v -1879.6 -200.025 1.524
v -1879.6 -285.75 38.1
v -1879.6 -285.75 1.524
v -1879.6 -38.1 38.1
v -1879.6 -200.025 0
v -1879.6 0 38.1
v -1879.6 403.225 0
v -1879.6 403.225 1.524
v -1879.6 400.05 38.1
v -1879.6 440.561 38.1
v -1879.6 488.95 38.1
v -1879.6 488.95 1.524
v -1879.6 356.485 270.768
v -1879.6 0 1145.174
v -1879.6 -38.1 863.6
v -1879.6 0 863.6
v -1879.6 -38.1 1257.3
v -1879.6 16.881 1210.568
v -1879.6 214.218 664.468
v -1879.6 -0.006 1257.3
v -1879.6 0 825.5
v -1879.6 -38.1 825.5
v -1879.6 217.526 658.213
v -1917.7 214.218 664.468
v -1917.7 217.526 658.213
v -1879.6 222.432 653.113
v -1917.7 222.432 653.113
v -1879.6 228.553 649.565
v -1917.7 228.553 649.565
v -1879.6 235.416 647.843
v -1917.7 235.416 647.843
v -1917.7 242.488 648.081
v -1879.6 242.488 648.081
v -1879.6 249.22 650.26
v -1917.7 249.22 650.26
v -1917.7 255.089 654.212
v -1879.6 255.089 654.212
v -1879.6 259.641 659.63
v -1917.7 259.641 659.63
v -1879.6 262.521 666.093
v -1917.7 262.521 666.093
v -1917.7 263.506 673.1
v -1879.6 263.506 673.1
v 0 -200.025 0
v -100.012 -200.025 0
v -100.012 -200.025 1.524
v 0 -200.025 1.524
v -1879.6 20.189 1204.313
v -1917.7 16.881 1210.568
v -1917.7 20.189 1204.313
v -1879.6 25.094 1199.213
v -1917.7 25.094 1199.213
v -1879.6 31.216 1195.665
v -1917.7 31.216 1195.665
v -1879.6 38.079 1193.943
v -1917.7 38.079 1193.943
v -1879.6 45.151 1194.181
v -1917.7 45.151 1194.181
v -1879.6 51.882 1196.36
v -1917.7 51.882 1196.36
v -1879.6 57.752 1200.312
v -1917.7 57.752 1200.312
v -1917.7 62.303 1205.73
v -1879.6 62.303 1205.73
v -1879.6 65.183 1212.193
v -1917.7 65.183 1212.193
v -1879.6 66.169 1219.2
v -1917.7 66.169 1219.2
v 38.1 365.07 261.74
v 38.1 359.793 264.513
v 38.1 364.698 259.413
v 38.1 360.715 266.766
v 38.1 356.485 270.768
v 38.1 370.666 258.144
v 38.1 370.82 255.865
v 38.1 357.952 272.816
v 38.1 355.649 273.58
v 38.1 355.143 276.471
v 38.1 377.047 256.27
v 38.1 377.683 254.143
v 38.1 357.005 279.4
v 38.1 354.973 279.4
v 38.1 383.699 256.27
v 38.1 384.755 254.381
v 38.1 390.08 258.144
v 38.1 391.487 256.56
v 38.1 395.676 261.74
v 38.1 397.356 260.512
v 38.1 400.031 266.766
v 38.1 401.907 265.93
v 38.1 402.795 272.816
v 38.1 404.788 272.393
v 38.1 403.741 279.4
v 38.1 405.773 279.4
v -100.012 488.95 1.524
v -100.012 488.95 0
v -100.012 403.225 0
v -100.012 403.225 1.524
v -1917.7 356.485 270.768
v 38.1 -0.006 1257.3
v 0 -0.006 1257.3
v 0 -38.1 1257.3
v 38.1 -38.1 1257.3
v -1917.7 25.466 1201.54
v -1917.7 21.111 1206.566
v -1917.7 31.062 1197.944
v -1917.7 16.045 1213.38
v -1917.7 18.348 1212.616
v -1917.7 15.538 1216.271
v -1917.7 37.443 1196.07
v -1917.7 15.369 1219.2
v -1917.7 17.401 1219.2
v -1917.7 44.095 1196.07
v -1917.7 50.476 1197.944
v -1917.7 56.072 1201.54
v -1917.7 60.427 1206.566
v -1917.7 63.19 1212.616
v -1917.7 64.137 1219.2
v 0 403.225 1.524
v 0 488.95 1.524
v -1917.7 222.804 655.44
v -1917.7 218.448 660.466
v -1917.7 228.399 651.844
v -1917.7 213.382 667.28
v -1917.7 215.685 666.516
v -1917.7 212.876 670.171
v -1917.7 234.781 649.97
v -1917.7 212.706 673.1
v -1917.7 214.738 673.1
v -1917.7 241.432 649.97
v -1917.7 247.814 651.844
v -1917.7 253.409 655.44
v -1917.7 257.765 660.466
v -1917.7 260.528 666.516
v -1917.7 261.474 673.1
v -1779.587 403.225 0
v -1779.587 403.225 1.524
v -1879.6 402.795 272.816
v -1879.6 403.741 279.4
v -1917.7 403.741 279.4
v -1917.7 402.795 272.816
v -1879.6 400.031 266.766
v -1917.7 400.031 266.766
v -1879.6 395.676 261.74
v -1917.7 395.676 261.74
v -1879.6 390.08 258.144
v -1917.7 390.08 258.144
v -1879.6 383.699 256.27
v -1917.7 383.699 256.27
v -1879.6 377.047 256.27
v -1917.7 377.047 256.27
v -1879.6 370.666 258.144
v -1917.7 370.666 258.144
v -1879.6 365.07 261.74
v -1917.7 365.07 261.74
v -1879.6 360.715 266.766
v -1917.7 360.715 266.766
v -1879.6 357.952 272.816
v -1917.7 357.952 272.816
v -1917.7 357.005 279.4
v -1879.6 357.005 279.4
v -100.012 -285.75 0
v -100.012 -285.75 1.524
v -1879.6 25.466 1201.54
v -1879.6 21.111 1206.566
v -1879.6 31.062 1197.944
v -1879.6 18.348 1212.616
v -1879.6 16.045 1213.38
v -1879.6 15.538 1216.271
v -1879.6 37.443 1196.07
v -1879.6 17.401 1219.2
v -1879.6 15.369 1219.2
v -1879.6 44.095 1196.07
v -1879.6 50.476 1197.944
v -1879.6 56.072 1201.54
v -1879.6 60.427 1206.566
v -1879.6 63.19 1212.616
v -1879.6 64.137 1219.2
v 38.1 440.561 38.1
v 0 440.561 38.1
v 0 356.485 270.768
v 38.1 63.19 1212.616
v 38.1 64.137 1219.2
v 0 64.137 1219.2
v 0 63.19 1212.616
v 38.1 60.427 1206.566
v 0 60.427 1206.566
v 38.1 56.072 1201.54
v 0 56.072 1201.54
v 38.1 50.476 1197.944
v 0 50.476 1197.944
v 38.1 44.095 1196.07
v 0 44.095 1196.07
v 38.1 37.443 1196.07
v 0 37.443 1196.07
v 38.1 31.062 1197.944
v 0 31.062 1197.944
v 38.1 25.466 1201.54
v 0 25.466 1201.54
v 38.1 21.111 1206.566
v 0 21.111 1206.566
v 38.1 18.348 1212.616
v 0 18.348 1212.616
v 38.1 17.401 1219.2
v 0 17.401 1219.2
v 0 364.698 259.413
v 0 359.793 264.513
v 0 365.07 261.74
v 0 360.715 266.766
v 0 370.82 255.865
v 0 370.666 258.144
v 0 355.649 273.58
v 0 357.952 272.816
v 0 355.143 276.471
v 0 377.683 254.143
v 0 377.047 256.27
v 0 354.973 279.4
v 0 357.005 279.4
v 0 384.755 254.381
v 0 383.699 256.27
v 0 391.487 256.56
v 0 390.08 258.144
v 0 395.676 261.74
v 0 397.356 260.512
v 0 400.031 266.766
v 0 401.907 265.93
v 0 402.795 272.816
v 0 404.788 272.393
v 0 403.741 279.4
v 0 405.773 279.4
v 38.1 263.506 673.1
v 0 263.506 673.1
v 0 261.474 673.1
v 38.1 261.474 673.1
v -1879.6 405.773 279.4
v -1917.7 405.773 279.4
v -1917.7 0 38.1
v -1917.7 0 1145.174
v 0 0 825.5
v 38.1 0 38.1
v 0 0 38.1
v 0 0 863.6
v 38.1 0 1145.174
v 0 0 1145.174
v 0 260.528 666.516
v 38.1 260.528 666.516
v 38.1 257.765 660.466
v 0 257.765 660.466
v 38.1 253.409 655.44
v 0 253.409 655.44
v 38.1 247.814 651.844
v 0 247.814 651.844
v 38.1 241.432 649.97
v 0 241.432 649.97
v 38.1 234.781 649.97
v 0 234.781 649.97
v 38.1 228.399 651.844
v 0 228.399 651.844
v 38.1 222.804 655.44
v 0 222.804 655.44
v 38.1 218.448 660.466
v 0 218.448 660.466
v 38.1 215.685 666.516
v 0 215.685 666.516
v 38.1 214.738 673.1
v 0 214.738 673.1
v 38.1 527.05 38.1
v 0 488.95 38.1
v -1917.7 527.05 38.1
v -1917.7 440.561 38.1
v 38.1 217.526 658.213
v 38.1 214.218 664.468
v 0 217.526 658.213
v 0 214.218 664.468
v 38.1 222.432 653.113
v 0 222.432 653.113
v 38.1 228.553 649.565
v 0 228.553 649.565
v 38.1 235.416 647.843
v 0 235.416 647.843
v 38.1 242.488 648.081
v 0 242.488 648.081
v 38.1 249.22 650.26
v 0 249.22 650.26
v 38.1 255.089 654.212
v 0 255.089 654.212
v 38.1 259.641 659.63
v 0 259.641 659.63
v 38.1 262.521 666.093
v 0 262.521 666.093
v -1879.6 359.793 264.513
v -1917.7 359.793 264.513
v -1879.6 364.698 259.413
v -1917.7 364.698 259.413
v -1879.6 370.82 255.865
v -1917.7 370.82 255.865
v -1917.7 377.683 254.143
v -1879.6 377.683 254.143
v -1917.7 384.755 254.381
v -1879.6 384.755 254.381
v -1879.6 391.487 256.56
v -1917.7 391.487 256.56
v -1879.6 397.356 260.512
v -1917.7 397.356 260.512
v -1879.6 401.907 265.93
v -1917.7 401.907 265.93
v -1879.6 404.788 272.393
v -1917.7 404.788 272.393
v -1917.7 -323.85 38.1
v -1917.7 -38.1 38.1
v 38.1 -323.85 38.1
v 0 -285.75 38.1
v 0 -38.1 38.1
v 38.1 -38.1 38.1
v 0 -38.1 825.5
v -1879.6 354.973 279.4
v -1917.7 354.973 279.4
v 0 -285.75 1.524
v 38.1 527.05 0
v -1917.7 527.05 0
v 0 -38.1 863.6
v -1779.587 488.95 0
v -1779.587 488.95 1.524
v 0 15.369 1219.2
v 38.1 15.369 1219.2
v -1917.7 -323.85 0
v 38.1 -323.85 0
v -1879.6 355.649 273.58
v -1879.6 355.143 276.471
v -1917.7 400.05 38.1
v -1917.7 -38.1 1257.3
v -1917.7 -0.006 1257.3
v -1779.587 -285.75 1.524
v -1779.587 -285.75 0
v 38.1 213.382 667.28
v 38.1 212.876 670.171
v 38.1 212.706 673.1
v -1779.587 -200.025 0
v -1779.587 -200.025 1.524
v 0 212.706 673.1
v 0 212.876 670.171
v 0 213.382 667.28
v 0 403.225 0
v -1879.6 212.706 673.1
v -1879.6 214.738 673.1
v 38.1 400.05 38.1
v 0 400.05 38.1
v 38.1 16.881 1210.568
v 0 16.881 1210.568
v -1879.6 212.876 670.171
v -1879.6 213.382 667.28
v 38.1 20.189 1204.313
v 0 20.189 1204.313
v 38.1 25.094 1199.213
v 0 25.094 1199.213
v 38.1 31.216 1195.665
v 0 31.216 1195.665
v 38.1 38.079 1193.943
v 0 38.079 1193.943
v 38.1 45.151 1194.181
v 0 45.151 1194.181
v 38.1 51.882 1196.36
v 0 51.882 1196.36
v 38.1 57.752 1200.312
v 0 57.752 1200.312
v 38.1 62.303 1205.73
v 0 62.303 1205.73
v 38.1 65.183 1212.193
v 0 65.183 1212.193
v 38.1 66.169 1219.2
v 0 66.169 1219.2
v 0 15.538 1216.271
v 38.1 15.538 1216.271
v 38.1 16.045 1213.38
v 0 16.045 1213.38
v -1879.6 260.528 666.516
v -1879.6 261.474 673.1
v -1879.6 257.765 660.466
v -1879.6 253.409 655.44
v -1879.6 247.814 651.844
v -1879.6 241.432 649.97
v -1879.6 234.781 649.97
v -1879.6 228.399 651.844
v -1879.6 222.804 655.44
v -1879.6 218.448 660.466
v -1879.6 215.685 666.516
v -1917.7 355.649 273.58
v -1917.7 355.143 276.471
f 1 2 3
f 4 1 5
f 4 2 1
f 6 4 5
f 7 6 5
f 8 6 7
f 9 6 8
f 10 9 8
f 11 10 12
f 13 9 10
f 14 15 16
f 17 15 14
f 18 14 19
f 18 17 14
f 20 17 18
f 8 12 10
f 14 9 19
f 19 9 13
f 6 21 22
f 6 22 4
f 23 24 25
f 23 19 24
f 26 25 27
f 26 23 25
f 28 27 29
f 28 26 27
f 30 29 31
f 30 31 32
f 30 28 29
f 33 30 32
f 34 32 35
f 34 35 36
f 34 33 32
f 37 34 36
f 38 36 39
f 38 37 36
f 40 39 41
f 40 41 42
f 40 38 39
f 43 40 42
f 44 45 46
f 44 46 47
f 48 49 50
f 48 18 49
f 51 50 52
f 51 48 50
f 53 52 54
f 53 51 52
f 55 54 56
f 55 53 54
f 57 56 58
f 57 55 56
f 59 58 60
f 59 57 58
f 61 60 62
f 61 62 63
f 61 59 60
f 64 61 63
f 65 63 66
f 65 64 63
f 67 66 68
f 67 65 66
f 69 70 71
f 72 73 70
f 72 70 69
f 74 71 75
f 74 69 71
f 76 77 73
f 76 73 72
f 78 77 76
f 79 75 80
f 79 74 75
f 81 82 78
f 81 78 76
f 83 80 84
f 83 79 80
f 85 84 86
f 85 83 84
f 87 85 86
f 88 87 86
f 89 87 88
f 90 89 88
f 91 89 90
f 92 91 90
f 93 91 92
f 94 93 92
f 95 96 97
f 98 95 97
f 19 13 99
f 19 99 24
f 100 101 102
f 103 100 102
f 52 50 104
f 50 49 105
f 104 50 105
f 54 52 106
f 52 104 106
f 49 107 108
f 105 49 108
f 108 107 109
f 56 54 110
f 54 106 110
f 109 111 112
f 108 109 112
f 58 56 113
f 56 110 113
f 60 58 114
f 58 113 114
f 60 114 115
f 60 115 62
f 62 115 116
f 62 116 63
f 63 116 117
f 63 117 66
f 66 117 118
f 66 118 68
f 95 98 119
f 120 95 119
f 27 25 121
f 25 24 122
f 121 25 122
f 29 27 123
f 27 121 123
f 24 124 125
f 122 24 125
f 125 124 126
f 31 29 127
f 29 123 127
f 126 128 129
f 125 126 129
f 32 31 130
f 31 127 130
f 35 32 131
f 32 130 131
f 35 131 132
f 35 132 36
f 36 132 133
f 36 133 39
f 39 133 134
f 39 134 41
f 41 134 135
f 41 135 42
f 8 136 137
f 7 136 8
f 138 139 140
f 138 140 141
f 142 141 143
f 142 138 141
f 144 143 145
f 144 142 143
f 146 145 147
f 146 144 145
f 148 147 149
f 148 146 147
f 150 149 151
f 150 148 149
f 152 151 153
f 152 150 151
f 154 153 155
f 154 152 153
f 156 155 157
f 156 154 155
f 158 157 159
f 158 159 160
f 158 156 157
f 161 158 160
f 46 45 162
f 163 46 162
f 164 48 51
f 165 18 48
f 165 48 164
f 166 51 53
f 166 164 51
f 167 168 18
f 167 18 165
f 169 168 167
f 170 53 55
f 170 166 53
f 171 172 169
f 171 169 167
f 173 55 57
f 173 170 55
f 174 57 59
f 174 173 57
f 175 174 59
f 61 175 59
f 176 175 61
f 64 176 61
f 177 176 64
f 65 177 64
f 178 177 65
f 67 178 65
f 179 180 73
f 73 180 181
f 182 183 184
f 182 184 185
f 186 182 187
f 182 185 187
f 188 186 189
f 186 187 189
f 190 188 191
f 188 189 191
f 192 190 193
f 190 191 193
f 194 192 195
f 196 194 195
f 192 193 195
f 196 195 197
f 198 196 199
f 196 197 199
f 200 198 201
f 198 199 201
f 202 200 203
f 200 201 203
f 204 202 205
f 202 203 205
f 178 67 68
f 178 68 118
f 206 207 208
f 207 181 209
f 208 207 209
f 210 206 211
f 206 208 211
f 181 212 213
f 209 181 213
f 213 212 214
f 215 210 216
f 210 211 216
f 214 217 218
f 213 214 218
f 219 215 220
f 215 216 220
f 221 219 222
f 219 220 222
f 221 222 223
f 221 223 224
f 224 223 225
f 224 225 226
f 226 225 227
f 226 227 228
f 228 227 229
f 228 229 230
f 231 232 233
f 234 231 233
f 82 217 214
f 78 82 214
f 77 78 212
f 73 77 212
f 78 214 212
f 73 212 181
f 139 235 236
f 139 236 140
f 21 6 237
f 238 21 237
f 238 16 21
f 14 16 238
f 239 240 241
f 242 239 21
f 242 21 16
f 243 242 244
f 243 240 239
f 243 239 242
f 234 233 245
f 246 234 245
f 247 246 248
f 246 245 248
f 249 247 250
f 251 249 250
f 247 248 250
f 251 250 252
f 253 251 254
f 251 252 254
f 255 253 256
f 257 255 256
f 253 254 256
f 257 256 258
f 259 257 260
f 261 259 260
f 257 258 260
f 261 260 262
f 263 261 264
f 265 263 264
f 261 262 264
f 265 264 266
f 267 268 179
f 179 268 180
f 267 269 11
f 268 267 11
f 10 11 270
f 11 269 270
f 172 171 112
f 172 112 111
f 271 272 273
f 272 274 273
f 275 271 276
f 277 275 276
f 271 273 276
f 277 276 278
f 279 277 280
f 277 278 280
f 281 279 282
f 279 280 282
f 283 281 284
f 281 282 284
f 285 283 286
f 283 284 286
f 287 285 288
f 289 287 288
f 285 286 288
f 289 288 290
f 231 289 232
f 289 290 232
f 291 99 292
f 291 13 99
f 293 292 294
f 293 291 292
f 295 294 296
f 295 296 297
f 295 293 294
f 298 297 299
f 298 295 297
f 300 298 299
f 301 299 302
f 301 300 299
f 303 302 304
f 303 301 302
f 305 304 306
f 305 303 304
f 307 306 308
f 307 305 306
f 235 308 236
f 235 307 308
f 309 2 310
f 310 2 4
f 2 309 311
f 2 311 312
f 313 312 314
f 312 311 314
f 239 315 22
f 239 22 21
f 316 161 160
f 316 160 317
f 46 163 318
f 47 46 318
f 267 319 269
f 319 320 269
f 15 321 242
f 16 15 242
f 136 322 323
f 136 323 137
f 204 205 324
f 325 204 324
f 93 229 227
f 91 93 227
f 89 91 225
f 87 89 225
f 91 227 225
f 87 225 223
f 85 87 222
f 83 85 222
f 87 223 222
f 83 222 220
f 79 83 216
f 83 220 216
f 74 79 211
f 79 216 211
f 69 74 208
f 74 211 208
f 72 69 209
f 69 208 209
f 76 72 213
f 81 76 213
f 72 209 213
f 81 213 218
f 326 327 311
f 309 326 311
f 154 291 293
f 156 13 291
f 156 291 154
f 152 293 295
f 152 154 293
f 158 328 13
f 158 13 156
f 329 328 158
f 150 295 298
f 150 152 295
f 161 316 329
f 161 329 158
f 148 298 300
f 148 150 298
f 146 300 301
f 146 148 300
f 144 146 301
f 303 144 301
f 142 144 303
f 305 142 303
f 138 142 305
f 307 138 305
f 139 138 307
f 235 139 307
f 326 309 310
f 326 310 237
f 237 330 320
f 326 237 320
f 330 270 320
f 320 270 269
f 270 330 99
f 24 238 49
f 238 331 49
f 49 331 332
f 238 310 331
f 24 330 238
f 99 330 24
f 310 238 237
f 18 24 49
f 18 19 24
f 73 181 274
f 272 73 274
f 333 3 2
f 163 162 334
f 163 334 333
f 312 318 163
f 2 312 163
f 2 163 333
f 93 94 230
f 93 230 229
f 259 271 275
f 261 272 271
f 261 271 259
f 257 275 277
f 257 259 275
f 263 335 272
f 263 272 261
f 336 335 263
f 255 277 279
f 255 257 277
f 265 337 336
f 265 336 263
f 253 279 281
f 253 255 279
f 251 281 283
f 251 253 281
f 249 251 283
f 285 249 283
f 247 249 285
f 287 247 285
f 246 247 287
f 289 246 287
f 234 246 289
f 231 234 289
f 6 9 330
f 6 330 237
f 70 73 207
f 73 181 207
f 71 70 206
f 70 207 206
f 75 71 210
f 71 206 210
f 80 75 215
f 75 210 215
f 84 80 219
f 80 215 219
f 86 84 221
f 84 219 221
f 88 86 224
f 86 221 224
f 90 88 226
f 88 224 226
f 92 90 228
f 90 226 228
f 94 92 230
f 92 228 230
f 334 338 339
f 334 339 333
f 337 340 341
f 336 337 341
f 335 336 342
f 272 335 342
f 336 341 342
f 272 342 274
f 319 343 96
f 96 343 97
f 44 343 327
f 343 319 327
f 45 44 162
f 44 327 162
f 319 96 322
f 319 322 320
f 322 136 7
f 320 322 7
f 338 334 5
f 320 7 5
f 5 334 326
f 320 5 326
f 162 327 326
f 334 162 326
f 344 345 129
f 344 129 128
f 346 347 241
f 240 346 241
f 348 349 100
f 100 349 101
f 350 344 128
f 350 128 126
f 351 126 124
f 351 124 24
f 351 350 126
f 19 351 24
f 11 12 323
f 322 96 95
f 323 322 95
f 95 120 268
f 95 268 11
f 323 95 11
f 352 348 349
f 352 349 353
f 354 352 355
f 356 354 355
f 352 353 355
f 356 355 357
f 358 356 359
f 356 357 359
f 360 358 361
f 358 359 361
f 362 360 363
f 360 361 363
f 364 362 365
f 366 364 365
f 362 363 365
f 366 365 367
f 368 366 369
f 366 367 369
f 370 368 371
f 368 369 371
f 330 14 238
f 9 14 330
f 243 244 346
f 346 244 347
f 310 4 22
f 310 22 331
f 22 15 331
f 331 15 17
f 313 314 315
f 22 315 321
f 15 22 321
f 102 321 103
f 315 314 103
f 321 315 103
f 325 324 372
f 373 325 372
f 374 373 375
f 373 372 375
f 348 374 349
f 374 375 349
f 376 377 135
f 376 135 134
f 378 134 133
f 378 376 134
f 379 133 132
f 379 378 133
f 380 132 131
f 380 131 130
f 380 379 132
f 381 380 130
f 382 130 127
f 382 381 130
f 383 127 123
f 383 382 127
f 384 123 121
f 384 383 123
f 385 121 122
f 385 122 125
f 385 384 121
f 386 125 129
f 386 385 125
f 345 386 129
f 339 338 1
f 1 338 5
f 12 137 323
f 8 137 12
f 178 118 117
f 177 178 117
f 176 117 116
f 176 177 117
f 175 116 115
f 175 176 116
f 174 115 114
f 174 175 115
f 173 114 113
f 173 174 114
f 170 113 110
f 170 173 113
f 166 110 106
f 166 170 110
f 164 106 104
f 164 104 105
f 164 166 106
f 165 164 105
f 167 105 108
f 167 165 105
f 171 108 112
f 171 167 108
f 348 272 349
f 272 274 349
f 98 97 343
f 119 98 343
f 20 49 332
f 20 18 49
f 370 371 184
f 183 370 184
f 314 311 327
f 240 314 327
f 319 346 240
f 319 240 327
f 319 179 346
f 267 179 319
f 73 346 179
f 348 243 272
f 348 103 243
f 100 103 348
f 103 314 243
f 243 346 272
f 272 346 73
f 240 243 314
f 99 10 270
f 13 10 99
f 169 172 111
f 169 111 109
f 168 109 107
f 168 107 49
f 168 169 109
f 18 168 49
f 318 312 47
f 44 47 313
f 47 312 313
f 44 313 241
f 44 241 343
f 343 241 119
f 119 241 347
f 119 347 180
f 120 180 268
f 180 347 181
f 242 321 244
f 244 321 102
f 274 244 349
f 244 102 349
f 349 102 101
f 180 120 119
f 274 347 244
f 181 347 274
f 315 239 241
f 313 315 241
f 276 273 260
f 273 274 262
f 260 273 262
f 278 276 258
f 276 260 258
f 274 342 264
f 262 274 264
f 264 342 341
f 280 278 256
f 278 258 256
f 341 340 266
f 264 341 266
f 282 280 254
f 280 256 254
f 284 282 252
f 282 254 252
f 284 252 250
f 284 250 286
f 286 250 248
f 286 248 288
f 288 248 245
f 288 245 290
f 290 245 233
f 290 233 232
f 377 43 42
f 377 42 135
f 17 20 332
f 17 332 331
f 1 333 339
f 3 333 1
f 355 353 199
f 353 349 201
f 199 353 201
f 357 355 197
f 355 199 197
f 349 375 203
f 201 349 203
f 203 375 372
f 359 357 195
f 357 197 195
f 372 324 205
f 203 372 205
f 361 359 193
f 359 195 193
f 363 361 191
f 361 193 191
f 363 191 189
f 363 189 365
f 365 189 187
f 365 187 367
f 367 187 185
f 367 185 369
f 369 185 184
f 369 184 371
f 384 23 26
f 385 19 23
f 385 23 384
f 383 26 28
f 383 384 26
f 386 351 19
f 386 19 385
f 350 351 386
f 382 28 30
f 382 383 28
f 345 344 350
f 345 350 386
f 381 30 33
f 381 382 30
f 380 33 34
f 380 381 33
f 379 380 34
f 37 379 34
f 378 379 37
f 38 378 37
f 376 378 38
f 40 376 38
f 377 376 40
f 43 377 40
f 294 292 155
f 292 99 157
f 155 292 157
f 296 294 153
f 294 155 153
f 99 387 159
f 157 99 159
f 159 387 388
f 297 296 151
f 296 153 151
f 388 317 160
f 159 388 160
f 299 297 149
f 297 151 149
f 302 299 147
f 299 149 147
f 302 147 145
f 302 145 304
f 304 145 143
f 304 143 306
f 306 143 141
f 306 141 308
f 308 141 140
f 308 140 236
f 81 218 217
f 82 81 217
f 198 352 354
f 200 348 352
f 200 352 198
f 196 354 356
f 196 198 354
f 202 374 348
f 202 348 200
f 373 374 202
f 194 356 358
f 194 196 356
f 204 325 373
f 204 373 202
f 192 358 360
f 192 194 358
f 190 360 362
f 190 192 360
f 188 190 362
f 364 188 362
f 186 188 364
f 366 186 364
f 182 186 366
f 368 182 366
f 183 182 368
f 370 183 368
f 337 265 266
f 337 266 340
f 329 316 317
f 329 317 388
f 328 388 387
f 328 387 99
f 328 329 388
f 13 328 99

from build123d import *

# Parameters (mm, degrees)
F1_DEPTH  = 38.1
F4_W      = 38.1
F4_H      = 38.1
F5_DEPTH  = 1879.6
F6_W      = 38.1
F6_H      = 38.1
F7_DEPTH  = 1917.7
F9_DEPTH  = 38.1
F11_W     = 100.0125
F11_H     = 85.725
F12_DEPTH = 1.524


# Not quite as in the source:
# - an extrude ends at something that could not be found from the text; its depth is read off the source's solid


with BuildPart() as f1:
    # F0 (on Right) → F1 (new body)
    with BuildSketch(Plane.YZ):
        Polygon((-323.85, 38.1), (-323.85, 0), (527.05, 0), (527.05, 38.1), (440.5612396804, 38.1), (-0.0062959033, 1257.3), (-38.1, 1257.3), (-38.1, 38.1), align=None)
        Polygon((400.05, 38.1), (0, 38.1), (0, 1145.1742181533), align=None, mode=Mode.SUBTRACT)
    extrude(amount=F1_DEPTH)


with BuildPart() as f3_1:
    # F3: instance of F1
    add(f1.part.mirror(Plane.YZ.offset(-939.8)))


with BuildPart() as f1_1:
    add(f1.part)

    add(f3_1.part)  # F5 merges F3_1
    # F4 (on Right) → F5 (join, through all)
    with BuildSketch(Plane.YZ):
        with Locations((-304.8, 19.05)):
            Rectangle(F4_W, F4_H)
        with Locations((508, 19.05)):
            Rectangle(F4_W, F4_H)
    extrude(amount=-F5_DEPTH)

    # F6 (on Right) → F7 (join, through all)
    with BuildSketch(Plane.YZ):
        with Locations((-19.05, 844.55)):
            Rectangle(F6_W, F6_H)
    extrude(amount=-F7_DEPTH)

    # F11 (on face) → F12 (join)
    with BuildSketch(Plane(origin=(0, 0, 0), x_dir=(1, 0, 0), z_dir=(0, 0, -1))):
        with Locations((-50.00625, 242.8875)):
            Rectangle(F11_W, F11_H)
        with Locations((-50.00625, -446.0875)):
            Rectangle(F11_W, F11_H)
    extrude(amount=-F12_DEPTH)



with BuildPart() as f9:
    # F8 (on Right) → F9 (new body)
    with BuildSketch(Plane.YZ):
        with BuildLine():
            ThreePointArc((15.3689327039, 1219.2), (40.7689327039, 1193.8), (66.1689327039, 1219.2))
            Line((66.1689327039, 1219.2), (64.1369327039, 1219.2))
            ThreePointArc((64.1369327039, 1219.2), (40.7689327039, 1195.832), (17.4009327039, 1219.2))
            Line((17.4009327039, 1219.2), (15.3689327039, 1219.2))
        make_face()
    extrude(amount=F9_DEPTH)


with BuildPart() as f9b:
    # F8 (on Right) → F9, piece 2 (new body)
    with BuildSketch(Plane.YZ):
        with BuildLine():
            ThreePointArc((212.7064746841, 673.1), (238.1064746841, 647.7), (263.5064746841, 673.1))
            Line((263.5064746841, 673.1), (261.4744746841, 673.1))
            ThreePointArc((261.4744746841, 673.1), (238.1064746841, 649.732), (214.7384746841, 673.1))
            Line((214.7384746841, 673.1), (212.7064746841, 673.1))
        make_face()
    extrude(amount=F9_DEPTH)


with BuildPart() as f9c:
    # F8 (on Right) → F9, piece 3 (new body)
    with BuildSketch(Plane.YZ):
        with BuildLine():
            ThreePointArc((354.9730747163, 279.4), (380.3730747163, 254), (405.7730747163, 279.4))
            Line((405.7730747163, 279.4), (403.7410747163, 279.4))
            ThreePointArc((403.7410747163, 279.4), (380.3730747163, 256.032), (357.0050747163, 279.4))
            Line((357.0050747163, 279.4), (354.9730747163, 279.4))
        make_face()
    extrude(amount=F9_DEPTH)


with BuildPart() as f10_1:
    # F10: instance of F9
    add(f9.part.mirror(Plane.YZ.offset(-939.8)))


with BuildPart() as f10_2:
    # F10: instance of F9b
    add(f9b.part.mirror(Plane.YZ.offset(-939.8)))


with BuildPart() as f10_3:
    # F10: instance of F9c
    add(f9c.part.mirror(Plane.YZ.offset(-939.8)))


with BuildPart() as f1_2:
    add(f1_1.part)

    add(f9.part)  # F13 merges F9

    add(f9b.part)  # F13 merges F9b

    add(f9c.part)  # F13 merges F9c

    add(f10_1.part)  # F13 merges F10_1

    add(f10_2.part)  # F13 merges F10_2

    add(f10_3.part)  # F13 merges F10_3
    # F13: F1 across plane
    add(f1_1.part.mirror(Plane.YZ.offset(-939.8)))


solid = f1_2.part
